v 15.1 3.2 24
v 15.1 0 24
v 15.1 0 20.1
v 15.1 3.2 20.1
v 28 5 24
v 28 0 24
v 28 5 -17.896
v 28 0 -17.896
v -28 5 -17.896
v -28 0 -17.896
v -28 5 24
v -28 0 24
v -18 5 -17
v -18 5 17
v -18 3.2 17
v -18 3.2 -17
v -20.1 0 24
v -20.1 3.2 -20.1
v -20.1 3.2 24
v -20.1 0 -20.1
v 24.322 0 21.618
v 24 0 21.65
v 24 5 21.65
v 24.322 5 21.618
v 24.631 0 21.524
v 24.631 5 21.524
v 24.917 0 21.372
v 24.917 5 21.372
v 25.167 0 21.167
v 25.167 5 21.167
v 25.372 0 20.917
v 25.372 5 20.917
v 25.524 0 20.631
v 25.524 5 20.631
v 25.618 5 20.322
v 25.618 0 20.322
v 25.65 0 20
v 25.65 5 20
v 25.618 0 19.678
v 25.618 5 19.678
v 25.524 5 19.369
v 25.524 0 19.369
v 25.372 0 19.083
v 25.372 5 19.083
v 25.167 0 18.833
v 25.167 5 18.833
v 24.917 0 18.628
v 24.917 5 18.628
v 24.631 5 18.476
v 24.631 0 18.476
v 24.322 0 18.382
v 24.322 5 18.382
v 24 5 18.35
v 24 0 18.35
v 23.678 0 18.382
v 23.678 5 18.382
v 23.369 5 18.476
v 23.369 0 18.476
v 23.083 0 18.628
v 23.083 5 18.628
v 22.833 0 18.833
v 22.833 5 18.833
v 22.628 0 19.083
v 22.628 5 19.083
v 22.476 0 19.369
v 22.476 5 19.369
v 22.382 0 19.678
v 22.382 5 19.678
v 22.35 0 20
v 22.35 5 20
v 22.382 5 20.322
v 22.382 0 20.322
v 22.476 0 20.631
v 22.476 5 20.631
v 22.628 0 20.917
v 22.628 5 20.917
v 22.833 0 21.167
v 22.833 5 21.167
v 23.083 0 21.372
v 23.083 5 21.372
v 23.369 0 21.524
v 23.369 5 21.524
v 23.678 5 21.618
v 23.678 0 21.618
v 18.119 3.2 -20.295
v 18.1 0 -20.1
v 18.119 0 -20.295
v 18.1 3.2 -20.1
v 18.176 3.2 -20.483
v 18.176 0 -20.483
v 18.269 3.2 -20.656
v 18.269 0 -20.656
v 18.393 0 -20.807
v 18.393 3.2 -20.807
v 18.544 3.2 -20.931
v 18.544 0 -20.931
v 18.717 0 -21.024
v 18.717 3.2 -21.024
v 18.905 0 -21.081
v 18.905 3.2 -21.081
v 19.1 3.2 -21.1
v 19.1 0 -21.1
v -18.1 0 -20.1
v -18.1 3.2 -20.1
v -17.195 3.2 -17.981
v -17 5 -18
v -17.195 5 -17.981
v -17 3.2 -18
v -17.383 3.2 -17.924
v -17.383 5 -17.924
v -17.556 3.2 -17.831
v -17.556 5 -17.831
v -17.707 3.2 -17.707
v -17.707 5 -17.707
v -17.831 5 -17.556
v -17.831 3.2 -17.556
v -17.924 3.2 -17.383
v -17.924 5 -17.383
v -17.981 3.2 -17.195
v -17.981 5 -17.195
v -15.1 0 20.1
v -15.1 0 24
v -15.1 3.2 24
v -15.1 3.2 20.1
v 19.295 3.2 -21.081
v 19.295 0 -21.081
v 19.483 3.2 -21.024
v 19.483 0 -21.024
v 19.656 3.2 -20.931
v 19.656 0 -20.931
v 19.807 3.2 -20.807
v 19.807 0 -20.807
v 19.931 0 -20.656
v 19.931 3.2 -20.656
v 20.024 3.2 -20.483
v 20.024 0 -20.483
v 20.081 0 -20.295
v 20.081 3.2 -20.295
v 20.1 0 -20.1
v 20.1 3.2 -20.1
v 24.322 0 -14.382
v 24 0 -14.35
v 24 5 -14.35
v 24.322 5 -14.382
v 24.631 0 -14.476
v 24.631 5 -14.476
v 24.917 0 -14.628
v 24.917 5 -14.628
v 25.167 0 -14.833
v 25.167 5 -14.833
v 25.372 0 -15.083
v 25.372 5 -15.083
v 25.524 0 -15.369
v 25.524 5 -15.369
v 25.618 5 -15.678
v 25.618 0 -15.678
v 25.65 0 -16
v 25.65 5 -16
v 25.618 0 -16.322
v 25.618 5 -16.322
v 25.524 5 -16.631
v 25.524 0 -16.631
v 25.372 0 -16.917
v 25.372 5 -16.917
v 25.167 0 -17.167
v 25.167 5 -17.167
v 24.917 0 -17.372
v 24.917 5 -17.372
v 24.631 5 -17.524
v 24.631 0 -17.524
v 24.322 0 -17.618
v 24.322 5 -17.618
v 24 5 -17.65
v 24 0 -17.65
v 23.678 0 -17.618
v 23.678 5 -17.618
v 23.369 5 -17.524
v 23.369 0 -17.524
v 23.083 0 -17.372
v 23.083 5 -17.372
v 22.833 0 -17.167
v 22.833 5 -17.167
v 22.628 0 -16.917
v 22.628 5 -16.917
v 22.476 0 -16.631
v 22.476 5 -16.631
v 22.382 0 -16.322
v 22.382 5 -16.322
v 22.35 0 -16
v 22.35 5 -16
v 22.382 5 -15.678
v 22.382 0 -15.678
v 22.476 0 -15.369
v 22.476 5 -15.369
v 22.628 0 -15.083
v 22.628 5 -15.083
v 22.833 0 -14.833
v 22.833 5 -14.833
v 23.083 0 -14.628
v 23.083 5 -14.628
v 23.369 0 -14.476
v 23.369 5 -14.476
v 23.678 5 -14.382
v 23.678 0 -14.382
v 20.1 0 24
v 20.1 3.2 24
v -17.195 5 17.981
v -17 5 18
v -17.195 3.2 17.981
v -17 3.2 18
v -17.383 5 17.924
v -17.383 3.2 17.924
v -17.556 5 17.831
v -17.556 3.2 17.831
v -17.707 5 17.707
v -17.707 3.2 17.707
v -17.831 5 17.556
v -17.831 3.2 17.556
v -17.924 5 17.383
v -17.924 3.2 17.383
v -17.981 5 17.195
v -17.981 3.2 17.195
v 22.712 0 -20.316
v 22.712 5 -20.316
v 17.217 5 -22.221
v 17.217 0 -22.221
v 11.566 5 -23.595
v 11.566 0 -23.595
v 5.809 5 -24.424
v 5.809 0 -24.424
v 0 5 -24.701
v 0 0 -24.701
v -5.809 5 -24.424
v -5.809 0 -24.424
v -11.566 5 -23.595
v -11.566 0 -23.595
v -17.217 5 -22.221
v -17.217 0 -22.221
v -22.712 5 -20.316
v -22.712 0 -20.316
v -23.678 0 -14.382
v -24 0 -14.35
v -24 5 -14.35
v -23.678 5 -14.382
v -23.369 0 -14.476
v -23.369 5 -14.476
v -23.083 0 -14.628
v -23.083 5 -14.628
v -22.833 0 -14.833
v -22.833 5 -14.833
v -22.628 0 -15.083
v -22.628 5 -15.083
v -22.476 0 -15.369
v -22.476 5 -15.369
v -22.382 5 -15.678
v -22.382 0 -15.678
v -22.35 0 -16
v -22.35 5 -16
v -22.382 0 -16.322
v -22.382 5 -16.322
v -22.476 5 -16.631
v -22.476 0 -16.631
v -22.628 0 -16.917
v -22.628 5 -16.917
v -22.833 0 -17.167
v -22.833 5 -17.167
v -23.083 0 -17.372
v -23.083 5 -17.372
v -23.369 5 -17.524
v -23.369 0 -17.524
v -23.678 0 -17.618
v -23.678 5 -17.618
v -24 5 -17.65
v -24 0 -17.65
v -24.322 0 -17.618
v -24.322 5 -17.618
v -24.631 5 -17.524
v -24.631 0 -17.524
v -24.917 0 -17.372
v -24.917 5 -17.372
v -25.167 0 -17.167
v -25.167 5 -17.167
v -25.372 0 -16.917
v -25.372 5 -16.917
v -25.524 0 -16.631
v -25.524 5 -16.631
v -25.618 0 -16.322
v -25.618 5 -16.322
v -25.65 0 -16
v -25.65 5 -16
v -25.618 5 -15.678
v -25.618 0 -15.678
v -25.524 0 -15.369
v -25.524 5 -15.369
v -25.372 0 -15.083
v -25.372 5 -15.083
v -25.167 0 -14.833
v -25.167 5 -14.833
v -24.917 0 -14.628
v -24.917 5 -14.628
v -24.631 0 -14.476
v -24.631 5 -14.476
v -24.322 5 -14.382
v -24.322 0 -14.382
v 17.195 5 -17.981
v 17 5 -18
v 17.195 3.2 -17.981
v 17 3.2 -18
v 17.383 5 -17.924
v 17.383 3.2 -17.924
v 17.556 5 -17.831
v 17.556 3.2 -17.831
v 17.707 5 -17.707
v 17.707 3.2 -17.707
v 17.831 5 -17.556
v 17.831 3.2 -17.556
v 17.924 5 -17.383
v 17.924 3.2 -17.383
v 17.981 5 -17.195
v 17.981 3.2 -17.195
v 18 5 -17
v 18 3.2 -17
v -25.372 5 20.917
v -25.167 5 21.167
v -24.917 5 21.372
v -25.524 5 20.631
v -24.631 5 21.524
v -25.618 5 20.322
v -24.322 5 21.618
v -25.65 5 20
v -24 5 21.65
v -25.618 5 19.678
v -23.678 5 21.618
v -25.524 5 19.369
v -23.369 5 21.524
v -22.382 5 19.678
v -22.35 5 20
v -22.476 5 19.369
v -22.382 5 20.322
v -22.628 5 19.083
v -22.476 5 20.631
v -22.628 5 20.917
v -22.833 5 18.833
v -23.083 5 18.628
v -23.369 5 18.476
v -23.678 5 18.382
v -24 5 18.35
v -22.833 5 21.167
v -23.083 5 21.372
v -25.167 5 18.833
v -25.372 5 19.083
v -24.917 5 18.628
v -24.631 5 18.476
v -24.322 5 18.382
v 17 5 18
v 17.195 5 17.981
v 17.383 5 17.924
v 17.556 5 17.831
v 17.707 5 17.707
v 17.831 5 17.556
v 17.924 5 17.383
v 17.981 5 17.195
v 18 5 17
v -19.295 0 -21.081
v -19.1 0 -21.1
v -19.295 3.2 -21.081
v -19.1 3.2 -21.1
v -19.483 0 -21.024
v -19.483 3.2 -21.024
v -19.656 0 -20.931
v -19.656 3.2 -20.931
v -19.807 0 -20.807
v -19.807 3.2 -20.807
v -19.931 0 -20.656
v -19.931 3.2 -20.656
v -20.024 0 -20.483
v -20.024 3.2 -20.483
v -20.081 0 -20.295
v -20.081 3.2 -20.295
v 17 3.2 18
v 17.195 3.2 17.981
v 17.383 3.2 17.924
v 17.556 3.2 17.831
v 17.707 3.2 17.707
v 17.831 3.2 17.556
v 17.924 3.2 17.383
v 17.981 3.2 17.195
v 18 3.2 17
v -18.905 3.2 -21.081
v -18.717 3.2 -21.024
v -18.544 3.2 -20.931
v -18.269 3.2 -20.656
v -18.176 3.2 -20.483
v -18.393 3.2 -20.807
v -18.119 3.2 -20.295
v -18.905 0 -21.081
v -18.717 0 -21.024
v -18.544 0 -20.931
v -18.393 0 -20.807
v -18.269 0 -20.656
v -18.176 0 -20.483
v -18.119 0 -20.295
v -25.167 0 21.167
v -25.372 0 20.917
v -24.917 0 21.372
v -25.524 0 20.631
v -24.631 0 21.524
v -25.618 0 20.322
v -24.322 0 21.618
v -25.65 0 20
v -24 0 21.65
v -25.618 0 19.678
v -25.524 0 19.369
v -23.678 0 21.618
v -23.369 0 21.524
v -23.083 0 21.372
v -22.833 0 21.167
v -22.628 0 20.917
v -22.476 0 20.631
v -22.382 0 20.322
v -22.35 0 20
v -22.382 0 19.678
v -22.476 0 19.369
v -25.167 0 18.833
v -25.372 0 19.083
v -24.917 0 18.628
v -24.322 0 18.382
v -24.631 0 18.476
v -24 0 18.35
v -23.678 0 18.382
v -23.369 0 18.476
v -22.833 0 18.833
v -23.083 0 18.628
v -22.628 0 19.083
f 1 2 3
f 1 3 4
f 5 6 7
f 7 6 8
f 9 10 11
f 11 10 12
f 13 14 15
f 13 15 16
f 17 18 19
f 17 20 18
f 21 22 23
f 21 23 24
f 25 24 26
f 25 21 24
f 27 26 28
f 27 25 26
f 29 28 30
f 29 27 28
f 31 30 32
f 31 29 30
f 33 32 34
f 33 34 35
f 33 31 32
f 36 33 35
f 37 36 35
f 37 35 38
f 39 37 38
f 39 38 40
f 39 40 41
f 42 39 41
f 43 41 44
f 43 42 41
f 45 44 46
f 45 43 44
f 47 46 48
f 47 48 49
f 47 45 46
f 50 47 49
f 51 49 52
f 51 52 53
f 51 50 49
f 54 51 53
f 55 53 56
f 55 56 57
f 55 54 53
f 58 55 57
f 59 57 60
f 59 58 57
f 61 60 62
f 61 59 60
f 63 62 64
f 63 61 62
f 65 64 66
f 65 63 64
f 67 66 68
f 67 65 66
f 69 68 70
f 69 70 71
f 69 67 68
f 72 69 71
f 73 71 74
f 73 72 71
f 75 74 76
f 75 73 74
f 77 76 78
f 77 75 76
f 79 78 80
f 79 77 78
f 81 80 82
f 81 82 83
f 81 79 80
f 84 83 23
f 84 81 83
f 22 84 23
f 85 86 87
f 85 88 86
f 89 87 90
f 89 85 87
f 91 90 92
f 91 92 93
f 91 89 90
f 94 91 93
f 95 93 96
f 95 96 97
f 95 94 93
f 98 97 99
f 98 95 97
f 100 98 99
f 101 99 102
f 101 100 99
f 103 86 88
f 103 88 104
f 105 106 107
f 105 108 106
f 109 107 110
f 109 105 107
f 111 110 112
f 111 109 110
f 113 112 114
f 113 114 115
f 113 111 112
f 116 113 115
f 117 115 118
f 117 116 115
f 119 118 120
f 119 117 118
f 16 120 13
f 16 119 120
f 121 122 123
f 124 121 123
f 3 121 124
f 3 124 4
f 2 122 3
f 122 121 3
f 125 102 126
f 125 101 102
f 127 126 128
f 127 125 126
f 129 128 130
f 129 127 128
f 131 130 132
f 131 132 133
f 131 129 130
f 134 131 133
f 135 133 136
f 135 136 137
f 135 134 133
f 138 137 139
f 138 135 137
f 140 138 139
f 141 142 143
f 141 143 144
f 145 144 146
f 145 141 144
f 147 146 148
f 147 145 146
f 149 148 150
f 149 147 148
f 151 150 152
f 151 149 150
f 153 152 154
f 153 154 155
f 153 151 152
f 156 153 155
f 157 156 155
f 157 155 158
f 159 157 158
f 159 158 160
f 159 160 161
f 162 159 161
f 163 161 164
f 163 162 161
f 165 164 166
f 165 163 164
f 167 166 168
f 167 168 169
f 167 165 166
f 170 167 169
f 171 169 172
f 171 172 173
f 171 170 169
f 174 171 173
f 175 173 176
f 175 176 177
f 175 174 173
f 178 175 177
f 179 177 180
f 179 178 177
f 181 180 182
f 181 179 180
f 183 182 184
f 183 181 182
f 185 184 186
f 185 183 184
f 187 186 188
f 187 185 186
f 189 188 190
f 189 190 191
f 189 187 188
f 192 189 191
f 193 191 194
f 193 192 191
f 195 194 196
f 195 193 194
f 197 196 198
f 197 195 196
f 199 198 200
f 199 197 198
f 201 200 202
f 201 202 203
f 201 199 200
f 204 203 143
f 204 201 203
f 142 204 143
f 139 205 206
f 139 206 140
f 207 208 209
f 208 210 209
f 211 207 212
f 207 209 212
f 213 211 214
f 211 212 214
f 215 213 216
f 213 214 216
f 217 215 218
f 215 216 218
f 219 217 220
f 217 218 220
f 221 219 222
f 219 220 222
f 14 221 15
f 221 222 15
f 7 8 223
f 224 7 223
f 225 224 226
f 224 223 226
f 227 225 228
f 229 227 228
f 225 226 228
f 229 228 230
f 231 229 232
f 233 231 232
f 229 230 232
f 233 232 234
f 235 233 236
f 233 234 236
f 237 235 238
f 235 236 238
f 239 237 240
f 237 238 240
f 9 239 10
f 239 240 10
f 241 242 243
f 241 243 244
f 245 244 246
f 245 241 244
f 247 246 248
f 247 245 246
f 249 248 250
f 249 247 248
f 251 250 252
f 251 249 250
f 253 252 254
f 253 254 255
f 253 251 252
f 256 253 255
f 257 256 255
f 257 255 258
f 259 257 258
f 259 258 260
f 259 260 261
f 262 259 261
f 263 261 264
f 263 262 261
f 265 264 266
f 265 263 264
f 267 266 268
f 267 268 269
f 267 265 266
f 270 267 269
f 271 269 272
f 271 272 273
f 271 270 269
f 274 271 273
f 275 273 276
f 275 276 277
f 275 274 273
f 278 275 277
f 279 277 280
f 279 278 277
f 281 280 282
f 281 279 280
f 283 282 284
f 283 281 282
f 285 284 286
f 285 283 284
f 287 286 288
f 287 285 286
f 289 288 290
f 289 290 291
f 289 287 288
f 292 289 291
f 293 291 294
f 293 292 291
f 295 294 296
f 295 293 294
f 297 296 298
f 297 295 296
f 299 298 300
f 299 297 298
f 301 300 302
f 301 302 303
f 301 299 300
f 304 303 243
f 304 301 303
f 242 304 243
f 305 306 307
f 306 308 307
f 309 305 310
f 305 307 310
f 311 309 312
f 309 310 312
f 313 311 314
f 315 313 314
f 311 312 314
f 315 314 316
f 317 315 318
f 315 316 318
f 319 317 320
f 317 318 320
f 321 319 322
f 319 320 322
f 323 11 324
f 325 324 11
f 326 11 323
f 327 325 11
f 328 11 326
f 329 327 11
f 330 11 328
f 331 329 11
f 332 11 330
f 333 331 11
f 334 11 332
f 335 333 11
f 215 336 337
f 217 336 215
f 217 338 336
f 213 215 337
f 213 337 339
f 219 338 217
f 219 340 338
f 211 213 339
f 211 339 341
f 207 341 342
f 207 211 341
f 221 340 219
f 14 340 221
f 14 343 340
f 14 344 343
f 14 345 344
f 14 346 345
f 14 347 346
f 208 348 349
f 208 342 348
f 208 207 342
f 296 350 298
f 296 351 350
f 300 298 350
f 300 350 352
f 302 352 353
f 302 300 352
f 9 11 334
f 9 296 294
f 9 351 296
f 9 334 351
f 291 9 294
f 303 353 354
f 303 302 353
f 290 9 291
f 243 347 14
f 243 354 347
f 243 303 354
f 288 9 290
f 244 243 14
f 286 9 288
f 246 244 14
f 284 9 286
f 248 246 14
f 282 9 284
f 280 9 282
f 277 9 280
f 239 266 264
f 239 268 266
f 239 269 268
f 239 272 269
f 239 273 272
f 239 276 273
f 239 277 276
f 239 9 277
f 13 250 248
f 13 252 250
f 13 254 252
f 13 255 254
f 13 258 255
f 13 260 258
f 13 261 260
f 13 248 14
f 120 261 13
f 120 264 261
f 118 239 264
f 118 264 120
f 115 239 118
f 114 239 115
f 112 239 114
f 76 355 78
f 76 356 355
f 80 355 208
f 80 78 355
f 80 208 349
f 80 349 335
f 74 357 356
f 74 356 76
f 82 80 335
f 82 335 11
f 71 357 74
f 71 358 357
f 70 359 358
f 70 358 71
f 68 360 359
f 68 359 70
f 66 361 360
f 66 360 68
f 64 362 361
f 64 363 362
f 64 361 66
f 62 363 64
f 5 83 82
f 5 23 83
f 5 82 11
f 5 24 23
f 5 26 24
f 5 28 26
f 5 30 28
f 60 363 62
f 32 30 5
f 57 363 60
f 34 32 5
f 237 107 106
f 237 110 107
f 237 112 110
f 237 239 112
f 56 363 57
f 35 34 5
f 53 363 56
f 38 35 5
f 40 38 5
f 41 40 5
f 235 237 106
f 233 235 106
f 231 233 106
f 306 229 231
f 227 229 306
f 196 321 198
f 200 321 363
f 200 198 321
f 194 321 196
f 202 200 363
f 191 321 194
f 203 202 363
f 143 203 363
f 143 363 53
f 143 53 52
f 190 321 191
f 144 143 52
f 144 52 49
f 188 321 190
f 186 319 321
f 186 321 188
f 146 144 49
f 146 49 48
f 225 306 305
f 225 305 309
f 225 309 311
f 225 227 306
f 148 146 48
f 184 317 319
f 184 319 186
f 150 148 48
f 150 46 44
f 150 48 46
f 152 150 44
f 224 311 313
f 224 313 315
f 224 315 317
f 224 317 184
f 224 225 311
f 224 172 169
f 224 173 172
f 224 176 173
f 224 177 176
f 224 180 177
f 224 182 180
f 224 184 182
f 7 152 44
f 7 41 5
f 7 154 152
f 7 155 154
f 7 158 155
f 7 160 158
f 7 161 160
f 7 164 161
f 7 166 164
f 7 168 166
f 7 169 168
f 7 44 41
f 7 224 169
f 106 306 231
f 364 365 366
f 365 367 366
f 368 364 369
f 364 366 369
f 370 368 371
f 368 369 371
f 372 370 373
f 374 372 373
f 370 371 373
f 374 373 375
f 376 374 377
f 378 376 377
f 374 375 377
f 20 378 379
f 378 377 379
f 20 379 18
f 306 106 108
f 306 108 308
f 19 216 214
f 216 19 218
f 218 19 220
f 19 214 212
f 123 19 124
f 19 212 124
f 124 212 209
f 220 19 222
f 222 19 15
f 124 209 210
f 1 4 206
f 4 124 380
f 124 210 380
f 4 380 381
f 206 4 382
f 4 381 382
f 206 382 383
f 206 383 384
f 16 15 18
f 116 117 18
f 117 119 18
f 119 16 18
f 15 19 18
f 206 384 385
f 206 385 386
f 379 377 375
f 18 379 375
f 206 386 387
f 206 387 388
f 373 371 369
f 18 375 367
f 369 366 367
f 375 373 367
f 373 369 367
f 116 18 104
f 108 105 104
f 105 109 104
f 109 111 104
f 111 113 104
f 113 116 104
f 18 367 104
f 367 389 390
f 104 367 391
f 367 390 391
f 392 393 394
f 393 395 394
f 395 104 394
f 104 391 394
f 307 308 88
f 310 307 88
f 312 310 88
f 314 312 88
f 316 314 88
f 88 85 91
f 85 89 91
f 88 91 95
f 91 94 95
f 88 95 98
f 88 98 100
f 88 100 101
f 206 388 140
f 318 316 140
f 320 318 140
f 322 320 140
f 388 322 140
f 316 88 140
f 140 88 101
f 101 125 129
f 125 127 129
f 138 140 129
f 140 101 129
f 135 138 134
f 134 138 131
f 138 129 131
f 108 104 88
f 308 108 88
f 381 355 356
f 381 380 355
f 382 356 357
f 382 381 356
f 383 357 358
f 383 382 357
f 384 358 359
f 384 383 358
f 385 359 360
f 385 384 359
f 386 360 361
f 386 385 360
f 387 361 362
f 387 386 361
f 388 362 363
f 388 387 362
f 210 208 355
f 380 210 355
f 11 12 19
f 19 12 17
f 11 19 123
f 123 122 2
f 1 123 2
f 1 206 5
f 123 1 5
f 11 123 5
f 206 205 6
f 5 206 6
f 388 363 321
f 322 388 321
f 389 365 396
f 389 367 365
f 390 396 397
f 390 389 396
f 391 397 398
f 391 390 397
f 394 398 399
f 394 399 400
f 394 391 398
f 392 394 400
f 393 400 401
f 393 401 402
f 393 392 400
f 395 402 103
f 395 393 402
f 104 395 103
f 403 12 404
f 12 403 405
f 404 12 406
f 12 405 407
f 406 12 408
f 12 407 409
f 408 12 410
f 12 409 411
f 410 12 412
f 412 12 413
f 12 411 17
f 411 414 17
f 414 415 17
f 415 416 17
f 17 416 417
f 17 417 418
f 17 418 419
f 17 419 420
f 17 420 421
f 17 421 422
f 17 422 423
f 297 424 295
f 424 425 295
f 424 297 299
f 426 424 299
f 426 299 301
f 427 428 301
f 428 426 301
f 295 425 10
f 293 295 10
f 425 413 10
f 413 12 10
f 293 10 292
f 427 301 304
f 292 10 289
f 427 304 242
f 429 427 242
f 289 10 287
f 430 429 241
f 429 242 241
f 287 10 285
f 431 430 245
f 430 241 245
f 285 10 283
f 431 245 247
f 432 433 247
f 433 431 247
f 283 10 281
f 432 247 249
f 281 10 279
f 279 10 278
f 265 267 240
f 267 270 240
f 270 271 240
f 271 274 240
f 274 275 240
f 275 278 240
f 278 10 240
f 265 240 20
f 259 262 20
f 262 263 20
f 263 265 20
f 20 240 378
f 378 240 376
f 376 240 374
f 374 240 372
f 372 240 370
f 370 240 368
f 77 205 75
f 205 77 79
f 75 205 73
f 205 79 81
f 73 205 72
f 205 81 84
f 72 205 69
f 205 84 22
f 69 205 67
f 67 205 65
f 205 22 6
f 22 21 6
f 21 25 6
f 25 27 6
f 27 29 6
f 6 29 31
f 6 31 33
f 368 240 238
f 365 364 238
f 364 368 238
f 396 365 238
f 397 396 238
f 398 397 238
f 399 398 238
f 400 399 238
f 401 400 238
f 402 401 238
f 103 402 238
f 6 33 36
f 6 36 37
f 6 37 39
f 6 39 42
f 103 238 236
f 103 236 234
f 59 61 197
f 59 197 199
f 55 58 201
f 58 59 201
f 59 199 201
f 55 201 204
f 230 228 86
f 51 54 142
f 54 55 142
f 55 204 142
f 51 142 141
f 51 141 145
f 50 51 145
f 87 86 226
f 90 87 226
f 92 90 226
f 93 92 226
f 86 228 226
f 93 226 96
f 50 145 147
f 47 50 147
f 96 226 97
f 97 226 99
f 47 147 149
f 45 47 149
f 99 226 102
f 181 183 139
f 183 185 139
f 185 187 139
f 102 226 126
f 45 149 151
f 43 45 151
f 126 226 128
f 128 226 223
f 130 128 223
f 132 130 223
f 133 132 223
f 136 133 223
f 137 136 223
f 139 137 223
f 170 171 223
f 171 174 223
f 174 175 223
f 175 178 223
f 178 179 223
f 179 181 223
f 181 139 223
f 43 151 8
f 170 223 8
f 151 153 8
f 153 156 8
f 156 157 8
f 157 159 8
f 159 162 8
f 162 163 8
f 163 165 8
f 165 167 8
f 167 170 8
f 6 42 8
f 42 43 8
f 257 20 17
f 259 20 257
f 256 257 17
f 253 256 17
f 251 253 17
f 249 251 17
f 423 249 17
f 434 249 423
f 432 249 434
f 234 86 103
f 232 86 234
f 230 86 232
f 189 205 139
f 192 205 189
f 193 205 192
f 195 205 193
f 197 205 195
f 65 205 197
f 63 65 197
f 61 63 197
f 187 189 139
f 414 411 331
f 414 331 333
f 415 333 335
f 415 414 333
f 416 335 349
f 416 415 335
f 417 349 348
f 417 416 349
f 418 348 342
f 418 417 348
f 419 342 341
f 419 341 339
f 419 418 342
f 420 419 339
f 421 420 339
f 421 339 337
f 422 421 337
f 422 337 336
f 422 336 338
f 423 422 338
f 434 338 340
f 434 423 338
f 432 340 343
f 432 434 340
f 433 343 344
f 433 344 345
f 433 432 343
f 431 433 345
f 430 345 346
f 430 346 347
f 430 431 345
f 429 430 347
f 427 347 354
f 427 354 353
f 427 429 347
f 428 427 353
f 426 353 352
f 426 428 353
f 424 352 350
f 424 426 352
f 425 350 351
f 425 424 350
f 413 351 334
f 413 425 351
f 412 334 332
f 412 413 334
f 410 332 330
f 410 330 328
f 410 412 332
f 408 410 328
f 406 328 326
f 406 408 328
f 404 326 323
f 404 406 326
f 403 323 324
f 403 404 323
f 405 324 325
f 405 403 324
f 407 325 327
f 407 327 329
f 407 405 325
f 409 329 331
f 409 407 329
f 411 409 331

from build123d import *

# Parameters (mm, degrees)
SKETCH1_R           = 1.65
BOSS_EXTRUDE1_DEPTH = 5
SKETCH2_W           = 36
SKETCH2_H           = 36
BOSS_EXTRUDE2_DEPTH = 1.8
CUT_EXTRUDE1_REACH  = 58.399
SKETCH3_W           = 5
SKETCH3_H           = 3.2
FILLET1_R           = 1


with BuildPart() as part:
    # Sketch1 → Boss-Extrude1 (new body)
    with BuildSketch(Plane(origin=(0, 0, 0), x_dir=(1, 0, 0), z_dir=(0, 1, 0))):
        with BuildLine():
            Line((-28, -24), (28, -24))
            Line((28, -24), (28, 17.89570392))
            ThreePointArc((28, 17.89570392), (0, 24.701428863), (-28, 17.89570392))
            Line((-28, 17.89570392), (-28, -24))
        make_face()
        with Locations(Location((-24, 16, 0), (0, 0, 270))):
            Circle(SKETCH1_R, mode=Mode.SUBTRACT)
        with Locations(Location((24, 16, 0), (0, 0, 270))):
            Circle(SKETCH1_R, mode=Mode.SUBTRACT)
        with Locations(Location((-24, -20, 0), (0, 0, 270))):
            Circle(SKETCH1_R, mode=Mode.SUBTRACT)
        with Locations(Location((24, -20, 0), (0, 0, 270))):
            Circle(SKETCH1_R, mode=Mode.SUBTRACT)
        Polygon((20.1, -20.1), (20.1, 21.1), (18.1, 21.1), (18.1, 20.1), (-18.1, 20.1), (-18.1, 21.1), (-20.1, 21.1), (-20.1, -20.1), align=None, mode=Mode.SUBTRACT)
    extrude(amount=BOSS_EXTRUDE1_DEPTH)

    # Sketch2 → Boss-Extrude2 (add)
    with BuildSketch(Plane(origin=(0, 5, 0), x_dir=(1, 0, 0), z_dir=(0, 1, 0))):
        Polygon((-20.1, 21.1), (-20.1, -20.1), (20.1, -20.1), (20.1, 21.1), (18.1, 21.1), (18.1, 20.1), (-18.1, 20.1), (-18.1, 21.1), align=None)
        Rectangle(SKETCH2_W, SKETCH2_H, mode=Mode.SUBTRACT)
    extrude(amount=-BOSS_EXTRUDE2_DEPTH)

    # Sketch3 → Cut-Extrude1 (cut, up to next)
    with BuildSketch(Plane.XY.offset(24), mode=Mode.PRIVATE) as cut_extrude1_sk1:
        with Locations((-17.6, 1.6)):
            Rectangle(SKETCH3_W, SKETCH3_H)
    cut_extrude1_tool1 = extrude(cut_extrude1_sk1.sketch, amount=-CUT_EXTRUDE1_REACH, mode=Mode.PRIVATE) & part.part
    # Sketch3 → Cut-Extrude1 (cut, up to next)
    with BuildSketch(Plane.XY.offset(24), mode=Mode.PRIVATE) as cut_extrude1_sk2:
        with Locations((17.6, 1.6)):
            Rectangle(SKETCH3_W, SKETCH3_H)
    cut_extrude1_tool2 = extrude(cut_extrude1_sk2.sketch, amount=-CUT_EXTRUDE1_REACH, mode=Mode.PRIVATE) & part.part
    add(cut_extrude1_tool1.solids().sort_by_distance((-17.6, 1.6, 24))[0], mode=Mode.SUBTRACT)
    add(cut_extrude1_tool2.solids().sort_by_distance((17.6, 1.6, 24))[0], mode=Mode.SUBTRACT)

    # Fillet1
    fillet1_edges = [part.edges().sort_by_distance(p)[0] for p in [
        (-18, 4.1, 18),
        (18, 4.1, 18),
        (18, 4.1, -18),
        (-18, 4.1, -18),
        (-20.1, 1.6, -21.1),
        (-18.1, 1.6, -21.1),
        (18.1, 1.6, -21.1),
        (20.1, 1.6, -21.1),
    ]]
    fillet(fillet1_edges, radius=FILLET1_R - 0.0001)  # a hair under: the kernel refuses the full size


solid = part.part
